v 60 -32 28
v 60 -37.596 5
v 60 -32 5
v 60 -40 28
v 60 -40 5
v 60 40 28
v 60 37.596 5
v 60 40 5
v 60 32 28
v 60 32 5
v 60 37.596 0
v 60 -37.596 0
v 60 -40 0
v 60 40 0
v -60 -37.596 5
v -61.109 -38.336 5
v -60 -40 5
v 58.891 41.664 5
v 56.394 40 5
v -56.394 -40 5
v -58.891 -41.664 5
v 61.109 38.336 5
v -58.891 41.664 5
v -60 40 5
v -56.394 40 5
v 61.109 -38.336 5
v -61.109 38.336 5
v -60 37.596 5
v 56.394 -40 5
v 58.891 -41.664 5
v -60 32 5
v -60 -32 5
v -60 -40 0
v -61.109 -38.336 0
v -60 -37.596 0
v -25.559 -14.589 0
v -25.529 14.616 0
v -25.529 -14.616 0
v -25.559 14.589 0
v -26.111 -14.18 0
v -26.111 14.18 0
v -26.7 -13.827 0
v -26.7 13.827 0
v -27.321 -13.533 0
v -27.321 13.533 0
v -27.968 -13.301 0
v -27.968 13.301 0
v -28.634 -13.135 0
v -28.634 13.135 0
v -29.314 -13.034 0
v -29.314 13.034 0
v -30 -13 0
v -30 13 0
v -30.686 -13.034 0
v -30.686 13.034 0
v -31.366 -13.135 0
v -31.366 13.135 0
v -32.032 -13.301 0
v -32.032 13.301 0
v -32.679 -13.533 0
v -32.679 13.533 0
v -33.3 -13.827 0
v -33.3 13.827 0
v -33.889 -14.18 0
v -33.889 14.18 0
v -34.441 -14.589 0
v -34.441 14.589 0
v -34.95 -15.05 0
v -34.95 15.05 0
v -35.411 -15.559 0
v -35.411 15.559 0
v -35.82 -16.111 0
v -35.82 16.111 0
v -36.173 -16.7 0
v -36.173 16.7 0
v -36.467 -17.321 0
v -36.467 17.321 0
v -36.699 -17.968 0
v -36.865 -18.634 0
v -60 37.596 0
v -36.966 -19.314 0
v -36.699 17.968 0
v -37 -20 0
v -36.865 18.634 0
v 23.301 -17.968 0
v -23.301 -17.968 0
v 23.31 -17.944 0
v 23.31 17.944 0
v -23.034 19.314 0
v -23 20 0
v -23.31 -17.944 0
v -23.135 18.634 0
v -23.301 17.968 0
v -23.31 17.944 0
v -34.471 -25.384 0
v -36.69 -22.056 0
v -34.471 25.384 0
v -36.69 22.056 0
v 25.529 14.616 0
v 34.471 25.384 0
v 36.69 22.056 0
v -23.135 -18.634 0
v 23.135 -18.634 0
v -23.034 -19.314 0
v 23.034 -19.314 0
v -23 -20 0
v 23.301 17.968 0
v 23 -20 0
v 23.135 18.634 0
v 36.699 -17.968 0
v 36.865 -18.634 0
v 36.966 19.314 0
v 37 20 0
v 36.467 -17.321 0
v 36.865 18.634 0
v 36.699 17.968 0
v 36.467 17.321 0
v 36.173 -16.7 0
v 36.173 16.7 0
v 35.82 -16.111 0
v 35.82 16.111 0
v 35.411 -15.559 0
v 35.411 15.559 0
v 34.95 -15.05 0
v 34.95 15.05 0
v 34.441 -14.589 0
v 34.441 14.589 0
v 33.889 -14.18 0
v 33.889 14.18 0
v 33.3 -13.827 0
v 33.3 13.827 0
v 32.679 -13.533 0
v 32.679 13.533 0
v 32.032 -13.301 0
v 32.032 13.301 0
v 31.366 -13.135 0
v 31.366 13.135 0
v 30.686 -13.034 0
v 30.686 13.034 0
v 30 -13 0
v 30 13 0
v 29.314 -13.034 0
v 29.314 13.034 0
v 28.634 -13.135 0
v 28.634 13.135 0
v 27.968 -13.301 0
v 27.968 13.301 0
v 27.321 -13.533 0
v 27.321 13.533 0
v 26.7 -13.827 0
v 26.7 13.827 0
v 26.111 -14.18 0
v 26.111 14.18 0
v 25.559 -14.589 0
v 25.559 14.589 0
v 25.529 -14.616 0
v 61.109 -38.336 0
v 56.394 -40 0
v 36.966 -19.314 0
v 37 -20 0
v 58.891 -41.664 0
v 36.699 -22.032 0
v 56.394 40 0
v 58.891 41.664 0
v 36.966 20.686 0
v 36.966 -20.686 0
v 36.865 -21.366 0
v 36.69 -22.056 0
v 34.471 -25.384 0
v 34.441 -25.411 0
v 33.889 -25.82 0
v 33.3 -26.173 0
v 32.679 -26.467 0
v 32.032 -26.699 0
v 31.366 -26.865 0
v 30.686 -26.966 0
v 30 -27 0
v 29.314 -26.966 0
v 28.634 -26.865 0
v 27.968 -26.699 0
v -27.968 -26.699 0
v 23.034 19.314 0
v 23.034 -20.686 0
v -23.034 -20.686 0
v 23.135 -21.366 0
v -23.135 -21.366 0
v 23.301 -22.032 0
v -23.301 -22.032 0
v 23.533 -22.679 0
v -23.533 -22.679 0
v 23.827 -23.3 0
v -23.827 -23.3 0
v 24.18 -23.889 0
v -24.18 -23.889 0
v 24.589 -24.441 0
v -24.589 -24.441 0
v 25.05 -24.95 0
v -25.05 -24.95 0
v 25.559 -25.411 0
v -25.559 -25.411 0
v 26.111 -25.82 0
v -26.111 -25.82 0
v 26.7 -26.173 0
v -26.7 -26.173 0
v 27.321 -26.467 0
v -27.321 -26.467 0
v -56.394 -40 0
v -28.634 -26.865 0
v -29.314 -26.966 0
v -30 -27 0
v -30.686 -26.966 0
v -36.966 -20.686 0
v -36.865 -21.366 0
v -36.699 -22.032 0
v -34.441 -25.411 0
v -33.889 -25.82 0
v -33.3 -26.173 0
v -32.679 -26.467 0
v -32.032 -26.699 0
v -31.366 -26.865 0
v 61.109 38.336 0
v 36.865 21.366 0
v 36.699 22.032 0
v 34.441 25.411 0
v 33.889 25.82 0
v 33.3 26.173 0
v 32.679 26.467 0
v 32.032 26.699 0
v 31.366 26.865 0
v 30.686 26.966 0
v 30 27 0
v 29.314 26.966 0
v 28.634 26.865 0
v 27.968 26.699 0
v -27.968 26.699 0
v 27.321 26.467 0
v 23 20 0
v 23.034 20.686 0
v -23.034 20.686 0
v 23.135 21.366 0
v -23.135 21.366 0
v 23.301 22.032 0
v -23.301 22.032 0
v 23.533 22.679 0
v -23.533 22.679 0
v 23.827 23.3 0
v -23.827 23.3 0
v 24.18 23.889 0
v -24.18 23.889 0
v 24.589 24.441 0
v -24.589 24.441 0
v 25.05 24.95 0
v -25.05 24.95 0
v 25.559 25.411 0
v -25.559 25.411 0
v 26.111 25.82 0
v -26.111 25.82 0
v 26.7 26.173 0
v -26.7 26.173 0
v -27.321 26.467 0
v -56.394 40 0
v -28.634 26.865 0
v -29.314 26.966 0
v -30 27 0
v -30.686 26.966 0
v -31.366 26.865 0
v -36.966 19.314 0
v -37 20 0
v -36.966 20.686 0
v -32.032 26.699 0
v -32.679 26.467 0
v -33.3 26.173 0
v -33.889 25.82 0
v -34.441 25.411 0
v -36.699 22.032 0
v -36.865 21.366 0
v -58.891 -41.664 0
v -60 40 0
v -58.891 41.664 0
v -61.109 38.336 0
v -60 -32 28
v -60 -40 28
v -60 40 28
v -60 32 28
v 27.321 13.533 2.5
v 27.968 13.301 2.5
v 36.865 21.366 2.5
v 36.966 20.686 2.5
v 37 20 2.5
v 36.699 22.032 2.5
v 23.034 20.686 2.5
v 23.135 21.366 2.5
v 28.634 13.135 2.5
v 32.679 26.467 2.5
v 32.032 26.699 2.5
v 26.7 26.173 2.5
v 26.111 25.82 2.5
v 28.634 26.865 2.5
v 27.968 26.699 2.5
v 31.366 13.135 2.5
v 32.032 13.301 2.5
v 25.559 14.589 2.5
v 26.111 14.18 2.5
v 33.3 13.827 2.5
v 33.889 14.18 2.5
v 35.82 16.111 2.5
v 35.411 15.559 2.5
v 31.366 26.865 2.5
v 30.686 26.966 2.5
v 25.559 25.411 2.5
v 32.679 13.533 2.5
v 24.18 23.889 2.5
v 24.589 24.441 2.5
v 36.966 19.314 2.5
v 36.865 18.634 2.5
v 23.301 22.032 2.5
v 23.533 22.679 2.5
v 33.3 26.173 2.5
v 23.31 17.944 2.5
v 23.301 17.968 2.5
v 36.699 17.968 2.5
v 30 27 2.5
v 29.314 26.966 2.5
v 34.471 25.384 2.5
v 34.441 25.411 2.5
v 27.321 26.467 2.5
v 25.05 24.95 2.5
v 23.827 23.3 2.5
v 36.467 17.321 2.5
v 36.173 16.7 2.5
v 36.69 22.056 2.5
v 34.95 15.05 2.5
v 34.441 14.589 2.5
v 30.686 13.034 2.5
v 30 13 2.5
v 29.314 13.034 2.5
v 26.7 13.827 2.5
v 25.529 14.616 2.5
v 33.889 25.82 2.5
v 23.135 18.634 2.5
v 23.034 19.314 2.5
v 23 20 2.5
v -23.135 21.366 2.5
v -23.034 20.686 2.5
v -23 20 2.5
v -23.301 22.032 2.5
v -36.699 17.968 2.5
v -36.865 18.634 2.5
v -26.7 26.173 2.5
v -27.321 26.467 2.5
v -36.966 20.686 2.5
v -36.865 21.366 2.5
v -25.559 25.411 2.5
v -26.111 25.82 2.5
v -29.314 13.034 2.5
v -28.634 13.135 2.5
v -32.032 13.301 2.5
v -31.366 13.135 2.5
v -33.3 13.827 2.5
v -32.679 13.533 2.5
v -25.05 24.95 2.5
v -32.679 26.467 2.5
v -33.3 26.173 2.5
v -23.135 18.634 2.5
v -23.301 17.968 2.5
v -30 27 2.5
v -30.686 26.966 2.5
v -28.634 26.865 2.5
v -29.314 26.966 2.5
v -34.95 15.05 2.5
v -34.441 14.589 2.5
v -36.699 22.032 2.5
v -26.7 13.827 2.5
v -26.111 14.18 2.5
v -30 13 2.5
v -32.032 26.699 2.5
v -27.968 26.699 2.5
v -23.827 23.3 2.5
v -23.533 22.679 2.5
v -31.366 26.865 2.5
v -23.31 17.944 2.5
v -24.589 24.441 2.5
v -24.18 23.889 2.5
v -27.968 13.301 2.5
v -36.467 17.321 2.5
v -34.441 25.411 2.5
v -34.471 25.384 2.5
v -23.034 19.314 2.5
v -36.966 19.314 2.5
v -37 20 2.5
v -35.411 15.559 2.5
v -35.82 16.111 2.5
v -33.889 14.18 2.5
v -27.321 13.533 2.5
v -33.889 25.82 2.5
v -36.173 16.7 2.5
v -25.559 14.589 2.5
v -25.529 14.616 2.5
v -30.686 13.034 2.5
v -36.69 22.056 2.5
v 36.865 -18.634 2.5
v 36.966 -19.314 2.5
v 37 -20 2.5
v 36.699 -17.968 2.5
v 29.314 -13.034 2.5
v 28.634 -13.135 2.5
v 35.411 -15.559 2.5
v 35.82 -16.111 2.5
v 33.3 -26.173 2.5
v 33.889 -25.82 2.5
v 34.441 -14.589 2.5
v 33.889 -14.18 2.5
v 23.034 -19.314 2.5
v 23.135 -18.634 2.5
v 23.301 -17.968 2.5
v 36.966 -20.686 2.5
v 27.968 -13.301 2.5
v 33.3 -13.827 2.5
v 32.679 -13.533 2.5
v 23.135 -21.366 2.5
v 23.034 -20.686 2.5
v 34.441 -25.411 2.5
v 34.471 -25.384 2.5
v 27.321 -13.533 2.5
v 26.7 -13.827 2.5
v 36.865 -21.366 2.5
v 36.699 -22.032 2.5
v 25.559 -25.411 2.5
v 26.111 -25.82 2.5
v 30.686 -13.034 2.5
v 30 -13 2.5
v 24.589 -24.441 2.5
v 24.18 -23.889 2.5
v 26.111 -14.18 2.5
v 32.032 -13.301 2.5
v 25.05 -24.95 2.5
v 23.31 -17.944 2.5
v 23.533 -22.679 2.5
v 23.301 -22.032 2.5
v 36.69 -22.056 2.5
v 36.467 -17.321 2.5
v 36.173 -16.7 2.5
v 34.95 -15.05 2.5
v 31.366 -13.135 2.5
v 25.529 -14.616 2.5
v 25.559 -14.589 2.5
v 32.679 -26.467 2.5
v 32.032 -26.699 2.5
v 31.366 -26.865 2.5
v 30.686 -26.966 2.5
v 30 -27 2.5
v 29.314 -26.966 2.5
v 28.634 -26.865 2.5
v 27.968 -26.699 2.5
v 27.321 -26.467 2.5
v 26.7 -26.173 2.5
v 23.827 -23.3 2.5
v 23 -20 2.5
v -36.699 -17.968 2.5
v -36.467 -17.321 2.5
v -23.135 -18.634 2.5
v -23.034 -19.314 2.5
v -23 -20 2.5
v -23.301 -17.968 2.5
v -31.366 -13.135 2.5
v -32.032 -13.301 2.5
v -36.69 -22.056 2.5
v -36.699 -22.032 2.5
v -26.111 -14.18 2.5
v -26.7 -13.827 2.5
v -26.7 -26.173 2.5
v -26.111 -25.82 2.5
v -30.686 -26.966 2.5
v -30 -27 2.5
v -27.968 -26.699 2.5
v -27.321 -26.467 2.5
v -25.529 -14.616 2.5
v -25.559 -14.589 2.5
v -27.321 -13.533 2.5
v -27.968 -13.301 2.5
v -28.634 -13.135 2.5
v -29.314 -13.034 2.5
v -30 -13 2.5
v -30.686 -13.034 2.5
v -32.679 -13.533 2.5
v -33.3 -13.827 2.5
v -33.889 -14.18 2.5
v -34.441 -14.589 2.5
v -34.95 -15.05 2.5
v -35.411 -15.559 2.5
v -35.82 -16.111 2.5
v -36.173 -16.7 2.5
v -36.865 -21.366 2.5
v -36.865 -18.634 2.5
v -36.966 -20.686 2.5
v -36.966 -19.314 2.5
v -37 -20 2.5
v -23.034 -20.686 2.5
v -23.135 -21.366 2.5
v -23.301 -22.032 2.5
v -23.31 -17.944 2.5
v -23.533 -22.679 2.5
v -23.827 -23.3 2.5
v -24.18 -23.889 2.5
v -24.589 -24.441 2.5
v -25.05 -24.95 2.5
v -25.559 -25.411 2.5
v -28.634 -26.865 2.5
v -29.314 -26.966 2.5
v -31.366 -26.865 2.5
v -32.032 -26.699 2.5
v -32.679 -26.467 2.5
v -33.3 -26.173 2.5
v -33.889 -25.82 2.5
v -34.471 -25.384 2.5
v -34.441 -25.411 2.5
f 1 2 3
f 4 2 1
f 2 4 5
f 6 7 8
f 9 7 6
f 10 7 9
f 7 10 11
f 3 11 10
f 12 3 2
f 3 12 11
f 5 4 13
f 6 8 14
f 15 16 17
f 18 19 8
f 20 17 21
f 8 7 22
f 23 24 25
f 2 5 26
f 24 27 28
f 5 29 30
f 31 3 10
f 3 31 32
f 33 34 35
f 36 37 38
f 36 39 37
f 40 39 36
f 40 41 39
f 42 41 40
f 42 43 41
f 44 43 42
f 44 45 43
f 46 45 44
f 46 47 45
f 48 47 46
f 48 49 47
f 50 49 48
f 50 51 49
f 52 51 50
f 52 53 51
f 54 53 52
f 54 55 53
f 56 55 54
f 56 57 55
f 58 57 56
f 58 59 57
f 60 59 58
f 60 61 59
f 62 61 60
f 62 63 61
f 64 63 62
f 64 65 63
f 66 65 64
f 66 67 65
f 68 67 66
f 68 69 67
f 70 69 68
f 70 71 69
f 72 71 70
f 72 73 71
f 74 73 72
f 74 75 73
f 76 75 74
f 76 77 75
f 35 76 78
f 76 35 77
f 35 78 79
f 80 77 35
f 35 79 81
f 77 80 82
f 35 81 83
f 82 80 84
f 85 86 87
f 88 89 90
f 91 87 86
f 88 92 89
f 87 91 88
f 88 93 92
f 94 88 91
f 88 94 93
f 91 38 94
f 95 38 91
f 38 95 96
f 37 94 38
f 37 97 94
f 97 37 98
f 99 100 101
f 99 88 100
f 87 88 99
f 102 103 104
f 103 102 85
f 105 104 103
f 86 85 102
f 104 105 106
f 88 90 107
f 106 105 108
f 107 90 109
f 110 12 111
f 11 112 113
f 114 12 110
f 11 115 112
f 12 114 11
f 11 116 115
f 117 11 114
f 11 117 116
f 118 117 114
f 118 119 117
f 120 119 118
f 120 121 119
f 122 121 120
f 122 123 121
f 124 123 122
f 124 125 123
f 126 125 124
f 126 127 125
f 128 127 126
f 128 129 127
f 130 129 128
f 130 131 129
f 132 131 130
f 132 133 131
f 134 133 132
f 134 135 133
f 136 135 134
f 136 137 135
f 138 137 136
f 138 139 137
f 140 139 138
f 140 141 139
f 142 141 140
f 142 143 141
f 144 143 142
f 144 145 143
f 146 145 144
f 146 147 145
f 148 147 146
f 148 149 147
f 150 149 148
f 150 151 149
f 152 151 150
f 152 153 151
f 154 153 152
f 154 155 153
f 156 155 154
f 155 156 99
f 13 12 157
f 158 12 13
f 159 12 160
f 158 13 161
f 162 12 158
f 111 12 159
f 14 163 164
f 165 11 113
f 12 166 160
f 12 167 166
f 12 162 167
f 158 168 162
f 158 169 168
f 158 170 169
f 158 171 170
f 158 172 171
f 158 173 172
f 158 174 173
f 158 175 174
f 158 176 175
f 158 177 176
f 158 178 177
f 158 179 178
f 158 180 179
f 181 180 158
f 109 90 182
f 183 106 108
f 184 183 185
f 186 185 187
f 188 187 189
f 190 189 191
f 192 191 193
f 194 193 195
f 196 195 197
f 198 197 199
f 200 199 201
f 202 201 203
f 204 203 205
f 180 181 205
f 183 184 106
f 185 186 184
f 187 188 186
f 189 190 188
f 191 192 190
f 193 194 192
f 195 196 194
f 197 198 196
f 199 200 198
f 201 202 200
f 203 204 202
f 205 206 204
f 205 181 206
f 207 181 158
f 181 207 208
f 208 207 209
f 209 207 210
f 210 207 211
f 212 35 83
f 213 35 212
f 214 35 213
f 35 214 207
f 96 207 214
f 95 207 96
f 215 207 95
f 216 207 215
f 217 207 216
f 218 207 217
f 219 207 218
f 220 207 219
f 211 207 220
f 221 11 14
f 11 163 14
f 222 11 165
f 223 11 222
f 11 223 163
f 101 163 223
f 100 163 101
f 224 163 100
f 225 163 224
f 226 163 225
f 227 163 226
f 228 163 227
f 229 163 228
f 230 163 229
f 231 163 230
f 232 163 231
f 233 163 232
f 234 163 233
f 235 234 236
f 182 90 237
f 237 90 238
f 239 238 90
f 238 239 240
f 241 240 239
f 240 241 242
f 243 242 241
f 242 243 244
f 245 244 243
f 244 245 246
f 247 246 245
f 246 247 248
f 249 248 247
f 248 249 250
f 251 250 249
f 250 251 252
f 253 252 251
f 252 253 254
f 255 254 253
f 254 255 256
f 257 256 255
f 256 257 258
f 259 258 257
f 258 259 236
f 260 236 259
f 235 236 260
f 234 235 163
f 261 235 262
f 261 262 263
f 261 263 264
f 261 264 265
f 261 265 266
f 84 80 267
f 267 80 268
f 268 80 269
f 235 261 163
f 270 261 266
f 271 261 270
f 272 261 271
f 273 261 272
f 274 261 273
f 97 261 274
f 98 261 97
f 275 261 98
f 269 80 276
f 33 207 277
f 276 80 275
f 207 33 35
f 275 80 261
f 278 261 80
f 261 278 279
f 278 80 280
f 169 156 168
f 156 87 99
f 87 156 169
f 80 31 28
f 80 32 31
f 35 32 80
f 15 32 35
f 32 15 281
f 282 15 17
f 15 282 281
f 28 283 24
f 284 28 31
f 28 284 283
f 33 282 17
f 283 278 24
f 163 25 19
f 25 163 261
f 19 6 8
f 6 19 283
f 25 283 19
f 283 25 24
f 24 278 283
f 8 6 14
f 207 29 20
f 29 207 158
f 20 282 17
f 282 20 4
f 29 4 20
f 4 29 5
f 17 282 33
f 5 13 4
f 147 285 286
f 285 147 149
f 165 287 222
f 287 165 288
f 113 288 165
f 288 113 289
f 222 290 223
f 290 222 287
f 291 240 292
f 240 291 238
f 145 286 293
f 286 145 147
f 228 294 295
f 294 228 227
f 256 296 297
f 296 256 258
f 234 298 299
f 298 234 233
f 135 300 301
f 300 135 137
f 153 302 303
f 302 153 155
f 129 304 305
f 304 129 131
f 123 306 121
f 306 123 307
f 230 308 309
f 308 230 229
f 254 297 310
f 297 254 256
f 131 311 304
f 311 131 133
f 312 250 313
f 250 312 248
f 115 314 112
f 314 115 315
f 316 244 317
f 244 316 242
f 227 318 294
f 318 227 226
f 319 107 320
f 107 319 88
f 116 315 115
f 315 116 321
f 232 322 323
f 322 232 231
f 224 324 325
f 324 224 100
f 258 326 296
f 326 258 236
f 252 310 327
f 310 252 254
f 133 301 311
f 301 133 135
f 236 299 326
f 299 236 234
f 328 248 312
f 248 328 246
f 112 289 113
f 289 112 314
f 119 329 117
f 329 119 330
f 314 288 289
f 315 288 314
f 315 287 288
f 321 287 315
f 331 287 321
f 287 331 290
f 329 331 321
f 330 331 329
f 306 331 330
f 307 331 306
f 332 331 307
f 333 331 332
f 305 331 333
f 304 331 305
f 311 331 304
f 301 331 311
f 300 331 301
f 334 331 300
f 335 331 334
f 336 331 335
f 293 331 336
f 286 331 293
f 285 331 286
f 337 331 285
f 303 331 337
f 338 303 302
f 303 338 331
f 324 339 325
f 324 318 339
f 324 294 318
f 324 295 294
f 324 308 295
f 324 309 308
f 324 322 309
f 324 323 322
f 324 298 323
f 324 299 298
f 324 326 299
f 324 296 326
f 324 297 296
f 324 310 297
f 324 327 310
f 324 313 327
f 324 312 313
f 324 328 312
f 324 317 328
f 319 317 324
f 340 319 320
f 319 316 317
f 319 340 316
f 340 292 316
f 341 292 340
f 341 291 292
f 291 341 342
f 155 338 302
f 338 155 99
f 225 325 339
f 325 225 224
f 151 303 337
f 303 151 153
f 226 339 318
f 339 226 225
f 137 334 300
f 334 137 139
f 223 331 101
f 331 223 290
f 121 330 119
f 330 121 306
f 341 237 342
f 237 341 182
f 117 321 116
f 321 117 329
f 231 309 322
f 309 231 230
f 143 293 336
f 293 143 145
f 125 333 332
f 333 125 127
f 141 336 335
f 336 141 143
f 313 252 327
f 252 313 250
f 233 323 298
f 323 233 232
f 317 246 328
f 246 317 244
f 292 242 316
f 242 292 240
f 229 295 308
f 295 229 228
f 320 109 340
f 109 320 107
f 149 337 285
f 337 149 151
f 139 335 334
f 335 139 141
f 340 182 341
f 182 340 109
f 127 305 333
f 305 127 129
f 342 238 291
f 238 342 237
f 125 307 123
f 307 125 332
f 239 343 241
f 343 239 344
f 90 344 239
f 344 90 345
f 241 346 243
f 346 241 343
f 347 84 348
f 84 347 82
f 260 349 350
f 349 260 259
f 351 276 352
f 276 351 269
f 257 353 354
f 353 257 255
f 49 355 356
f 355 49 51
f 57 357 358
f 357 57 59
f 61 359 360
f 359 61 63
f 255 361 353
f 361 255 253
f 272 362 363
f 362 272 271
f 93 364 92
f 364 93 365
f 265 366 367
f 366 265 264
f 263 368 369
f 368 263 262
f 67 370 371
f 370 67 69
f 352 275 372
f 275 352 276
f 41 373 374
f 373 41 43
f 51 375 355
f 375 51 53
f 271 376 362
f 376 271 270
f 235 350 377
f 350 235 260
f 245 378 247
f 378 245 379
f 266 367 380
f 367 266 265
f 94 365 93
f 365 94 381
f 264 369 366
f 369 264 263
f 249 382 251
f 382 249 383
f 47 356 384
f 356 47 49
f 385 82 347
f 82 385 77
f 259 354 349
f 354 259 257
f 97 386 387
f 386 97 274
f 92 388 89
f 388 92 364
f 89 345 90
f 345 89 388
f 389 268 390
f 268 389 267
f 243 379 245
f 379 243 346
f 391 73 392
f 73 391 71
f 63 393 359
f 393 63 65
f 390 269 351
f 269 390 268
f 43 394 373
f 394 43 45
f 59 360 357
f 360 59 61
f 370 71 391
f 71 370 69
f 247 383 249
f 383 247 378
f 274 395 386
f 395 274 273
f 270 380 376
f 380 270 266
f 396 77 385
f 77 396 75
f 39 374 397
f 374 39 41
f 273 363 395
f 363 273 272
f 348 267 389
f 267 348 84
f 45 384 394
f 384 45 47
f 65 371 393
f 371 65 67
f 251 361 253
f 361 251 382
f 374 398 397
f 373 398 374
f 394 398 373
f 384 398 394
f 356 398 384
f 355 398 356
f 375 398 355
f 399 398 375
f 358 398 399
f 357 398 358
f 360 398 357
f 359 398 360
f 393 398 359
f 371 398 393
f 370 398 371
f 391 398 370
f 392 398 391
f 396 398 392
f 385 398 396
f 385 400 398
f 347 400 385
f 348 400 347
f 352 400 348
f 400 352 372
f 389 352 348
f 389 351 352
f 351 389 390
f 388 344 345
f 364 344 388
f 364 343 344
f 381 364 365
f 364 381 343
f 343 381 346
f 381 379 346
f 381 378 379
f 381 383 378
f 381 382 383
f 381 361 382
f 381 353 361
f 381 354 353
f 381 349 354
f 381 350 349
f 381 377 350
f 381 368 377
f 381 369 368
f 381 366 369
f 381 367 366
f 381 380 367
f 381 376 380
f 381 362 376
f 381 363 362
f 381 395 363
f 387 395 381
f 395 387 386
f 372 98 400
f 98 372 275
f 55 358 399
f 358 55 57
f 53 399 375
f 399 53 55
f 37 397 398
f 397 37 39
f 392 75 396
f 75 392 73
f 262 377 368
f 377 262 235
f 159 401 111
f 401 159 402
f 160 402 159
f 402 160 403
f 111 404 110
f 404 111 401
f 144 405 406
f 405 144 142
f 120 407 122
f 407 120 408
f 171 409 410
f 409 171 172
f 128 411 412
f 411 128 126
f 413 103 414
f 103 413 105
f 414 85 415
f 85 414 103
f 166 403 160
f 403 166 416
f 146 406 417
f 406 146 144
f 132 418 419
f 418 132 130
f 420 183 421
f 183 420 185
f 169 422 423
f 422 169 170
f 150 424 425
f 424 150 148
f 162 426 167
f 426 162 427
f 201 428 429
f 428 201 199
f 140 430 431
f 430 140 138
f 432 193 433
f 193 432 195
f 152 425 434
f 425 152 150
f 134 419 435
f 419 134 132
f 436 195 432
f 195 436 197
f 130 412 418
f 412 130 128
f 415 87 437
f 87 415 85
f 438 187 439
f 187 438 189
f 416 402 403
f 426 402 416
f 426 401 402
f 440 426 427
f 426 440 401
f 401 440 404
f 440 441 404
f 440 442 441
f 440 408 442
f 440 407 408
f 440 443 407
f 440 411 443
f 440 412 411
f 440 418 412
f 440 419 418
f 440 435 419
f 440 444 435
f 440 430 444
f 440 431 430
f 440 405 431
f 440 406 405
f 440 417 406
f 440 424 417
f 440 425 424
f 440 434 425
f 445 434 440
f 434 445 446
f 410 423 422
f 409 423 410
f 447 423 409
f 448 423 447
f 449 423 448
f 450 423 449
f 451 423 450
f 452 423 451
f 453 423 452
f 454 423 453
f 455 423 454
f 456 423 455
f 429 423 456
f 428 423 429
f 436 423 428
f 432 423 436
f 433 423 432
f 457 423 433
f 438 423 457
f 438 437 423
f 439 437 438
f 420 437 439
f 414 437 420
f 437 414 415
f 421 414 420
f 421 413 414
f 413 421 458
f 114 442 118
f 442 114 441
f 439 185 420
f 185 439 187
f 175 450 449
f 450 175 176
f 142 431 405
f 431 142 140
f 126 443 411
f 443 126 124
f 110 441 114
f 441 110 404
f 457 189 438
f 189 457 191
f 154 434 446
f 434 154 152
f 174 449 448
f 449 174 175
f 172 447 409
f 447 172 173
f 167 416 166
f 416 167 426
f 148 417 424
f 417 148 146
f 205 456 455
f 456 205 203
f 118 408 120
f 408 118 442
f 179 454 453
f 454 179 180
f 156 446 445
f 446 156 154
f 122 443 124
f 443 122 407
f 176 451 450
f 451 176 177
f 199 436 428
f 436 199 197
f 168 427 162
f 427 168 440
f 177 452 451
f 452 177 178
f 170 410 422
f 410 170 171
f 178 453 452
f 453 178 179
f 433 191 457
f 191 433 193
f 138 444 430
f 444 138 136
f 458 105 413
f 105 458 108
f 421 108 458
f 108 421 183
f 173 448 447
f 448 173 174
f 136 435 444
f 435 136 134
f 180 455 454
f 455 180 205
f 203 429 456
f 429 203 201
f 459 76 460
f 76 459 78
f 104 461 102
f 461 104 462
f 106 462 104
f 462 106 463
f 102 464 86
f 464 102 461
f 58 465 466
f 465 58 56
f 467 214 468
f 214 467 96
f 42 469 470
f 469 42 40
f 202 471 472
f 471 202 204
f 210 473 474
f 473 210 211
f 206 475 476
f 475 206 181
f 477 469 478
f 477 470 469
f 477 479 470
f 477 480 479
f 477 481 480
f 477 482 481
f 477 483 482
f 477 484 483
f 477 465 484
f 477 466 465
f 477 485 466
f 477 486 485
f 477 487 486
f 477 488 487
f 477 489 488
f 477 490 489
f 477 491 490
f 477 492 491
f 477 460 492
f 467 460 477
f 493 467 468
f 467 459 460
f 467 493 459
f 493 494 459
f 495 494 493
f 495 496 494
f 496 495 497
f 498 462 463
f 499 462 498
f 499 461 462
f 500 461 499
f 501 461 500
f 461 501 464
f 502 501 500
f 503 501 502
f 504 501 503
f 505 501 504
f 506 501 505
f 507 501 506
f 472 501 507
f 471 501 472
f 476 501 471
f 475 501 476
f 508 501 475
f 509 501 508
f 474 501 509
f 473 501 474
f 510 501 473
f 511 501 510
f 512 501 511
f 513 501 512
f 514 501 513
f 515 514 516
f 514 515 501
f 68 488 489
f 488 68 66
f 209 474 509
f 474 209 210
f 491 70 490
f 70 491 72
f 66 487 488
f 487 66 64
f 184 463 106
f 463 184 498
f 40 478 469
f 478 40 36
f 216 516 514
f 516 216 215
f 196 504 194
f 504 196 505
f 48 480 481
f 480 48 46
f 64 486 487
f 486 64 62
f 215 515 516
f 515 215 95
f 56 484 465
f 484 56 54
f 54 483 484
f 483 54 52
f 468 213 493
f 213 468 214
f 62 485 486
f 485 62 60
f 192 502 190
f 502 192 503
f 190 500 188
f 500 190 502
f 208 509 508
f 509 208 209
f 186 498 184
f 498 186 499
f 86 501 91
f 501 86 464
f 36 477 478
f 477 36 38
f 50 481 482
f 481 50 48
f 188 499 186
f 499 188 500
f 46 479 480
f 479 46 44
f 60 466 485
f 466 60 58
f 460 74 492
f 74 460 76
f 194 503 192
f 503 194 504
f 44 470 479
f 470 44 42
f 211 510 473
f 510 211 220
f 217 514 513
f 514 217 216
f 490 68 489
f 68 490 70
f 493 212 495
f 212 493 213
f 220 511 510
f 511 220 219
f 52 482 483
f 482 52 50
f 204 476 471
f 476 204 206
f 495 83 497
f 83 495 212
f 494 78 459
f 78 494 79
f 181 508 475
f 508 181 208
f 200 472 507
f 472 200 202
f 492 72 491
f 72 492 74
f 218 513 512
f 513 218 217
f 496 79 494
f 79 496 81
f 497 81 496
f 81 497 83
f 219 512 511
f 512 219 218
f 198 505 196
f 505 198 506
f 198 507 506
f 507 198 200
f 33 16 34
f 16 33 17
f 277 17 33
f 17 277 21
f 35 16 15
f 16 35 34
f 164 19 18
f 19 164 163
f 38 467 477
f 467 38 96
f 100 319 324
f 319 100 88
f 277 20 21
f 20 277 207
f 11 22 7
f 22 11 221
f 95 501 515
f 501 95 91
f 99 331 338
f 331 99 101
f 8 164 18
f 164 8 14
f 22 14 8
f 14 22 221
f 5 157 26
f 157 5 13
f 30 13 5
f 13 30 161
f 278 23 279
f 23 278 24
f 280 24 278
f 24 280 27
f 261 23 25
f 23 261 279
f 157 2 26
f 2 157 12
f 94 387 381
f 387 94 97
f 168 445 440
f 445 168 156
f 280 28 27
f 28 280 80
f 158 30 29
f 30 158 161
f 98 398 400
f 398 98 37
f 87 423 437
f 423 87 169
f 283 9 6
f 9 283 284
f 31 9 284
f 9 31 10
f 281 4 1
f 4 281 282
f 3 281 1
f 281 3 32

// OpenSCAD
// Parameters
overall_length = 120;
overall_width = 80;
web_thickness = 5;
wall_height = 28;
wall_thickness = 8;
rib_thickness = 4;
hole_diameter = 14;
$fn = 64;

// Module: Base web with circular cutouts
module base_web() {
    difference() {
        cube([overall_length, overall_width, web_thickness], center=true);
        // Four circular openings
        translate([overall_length/4, overall_width/4, -web_thickness - 0.5])
            cylinder(h=web_thickness * 2 + 1, d=hole_diameter, center=true);
        translate([-overall_length/4, overall_width/4, -web_thickness - 0.5])
            cylinder(h=web_thickness * 2 + 1, d=hole_diameter, center=true);
        translate([overall_length/4, -overall_width/4, -web_thickness - 0.5])
            cylinder(h=web_thickness * 2 + 1, d=hole_diameter, center=true);
        translate([-overall_length/4, -overall_width/4, -web_thickness - 0.5])
            cylinder(h=web_thickness * 2 + 1, d=hole_diameter, center=true);
    }
}

// Module: Internal cross and diagonal ribs
module internal_ribs() {
    // Horizontal cross rib
    cube([overall_length, rib_thickness, web_thickness], center=true);
    // Vertical cross rib
    cube([rib_thickness, overall_width, web_thickness], center=true);
    // Diagonal ribs
    diag_len = sqrt(pow(overall_length, 2) + pow(overall_width, 2));
    diag_angle = atan2(overall_width, overall_length);
    rotate([0, 0, diag_angle]) cube([diag_len, rib_thickness, web_thickness], center=true);
    rotate([0, 0, -diag_angle]) cube([diag_len, rib_thickness, web_thickness], center=true);
}

// Module: Tall side walls along opposite edges
module side_walls() {
    translate([0, overall_width/2 - wall_thickness/2, 0])
        cube([overall_length, wall_thickness, wall_height], center=true);
    translate([0, -overall_width/2 + wall_thickness/2, 0])
        cube([overall_length, wall_thickness, wall_height], center=true);
}

// Main assembly: Combine web, ribs, and walls
union() {
    // Position shallow web and ribs at the base level
    translate([0, 0, web_thickness/2]) {
        base_web();
        internal_ribs();
    }
    // Position taller side walls rising from the same base
    translate([0, 0, wall_height/2]) {
        side_walls();
    }
}
